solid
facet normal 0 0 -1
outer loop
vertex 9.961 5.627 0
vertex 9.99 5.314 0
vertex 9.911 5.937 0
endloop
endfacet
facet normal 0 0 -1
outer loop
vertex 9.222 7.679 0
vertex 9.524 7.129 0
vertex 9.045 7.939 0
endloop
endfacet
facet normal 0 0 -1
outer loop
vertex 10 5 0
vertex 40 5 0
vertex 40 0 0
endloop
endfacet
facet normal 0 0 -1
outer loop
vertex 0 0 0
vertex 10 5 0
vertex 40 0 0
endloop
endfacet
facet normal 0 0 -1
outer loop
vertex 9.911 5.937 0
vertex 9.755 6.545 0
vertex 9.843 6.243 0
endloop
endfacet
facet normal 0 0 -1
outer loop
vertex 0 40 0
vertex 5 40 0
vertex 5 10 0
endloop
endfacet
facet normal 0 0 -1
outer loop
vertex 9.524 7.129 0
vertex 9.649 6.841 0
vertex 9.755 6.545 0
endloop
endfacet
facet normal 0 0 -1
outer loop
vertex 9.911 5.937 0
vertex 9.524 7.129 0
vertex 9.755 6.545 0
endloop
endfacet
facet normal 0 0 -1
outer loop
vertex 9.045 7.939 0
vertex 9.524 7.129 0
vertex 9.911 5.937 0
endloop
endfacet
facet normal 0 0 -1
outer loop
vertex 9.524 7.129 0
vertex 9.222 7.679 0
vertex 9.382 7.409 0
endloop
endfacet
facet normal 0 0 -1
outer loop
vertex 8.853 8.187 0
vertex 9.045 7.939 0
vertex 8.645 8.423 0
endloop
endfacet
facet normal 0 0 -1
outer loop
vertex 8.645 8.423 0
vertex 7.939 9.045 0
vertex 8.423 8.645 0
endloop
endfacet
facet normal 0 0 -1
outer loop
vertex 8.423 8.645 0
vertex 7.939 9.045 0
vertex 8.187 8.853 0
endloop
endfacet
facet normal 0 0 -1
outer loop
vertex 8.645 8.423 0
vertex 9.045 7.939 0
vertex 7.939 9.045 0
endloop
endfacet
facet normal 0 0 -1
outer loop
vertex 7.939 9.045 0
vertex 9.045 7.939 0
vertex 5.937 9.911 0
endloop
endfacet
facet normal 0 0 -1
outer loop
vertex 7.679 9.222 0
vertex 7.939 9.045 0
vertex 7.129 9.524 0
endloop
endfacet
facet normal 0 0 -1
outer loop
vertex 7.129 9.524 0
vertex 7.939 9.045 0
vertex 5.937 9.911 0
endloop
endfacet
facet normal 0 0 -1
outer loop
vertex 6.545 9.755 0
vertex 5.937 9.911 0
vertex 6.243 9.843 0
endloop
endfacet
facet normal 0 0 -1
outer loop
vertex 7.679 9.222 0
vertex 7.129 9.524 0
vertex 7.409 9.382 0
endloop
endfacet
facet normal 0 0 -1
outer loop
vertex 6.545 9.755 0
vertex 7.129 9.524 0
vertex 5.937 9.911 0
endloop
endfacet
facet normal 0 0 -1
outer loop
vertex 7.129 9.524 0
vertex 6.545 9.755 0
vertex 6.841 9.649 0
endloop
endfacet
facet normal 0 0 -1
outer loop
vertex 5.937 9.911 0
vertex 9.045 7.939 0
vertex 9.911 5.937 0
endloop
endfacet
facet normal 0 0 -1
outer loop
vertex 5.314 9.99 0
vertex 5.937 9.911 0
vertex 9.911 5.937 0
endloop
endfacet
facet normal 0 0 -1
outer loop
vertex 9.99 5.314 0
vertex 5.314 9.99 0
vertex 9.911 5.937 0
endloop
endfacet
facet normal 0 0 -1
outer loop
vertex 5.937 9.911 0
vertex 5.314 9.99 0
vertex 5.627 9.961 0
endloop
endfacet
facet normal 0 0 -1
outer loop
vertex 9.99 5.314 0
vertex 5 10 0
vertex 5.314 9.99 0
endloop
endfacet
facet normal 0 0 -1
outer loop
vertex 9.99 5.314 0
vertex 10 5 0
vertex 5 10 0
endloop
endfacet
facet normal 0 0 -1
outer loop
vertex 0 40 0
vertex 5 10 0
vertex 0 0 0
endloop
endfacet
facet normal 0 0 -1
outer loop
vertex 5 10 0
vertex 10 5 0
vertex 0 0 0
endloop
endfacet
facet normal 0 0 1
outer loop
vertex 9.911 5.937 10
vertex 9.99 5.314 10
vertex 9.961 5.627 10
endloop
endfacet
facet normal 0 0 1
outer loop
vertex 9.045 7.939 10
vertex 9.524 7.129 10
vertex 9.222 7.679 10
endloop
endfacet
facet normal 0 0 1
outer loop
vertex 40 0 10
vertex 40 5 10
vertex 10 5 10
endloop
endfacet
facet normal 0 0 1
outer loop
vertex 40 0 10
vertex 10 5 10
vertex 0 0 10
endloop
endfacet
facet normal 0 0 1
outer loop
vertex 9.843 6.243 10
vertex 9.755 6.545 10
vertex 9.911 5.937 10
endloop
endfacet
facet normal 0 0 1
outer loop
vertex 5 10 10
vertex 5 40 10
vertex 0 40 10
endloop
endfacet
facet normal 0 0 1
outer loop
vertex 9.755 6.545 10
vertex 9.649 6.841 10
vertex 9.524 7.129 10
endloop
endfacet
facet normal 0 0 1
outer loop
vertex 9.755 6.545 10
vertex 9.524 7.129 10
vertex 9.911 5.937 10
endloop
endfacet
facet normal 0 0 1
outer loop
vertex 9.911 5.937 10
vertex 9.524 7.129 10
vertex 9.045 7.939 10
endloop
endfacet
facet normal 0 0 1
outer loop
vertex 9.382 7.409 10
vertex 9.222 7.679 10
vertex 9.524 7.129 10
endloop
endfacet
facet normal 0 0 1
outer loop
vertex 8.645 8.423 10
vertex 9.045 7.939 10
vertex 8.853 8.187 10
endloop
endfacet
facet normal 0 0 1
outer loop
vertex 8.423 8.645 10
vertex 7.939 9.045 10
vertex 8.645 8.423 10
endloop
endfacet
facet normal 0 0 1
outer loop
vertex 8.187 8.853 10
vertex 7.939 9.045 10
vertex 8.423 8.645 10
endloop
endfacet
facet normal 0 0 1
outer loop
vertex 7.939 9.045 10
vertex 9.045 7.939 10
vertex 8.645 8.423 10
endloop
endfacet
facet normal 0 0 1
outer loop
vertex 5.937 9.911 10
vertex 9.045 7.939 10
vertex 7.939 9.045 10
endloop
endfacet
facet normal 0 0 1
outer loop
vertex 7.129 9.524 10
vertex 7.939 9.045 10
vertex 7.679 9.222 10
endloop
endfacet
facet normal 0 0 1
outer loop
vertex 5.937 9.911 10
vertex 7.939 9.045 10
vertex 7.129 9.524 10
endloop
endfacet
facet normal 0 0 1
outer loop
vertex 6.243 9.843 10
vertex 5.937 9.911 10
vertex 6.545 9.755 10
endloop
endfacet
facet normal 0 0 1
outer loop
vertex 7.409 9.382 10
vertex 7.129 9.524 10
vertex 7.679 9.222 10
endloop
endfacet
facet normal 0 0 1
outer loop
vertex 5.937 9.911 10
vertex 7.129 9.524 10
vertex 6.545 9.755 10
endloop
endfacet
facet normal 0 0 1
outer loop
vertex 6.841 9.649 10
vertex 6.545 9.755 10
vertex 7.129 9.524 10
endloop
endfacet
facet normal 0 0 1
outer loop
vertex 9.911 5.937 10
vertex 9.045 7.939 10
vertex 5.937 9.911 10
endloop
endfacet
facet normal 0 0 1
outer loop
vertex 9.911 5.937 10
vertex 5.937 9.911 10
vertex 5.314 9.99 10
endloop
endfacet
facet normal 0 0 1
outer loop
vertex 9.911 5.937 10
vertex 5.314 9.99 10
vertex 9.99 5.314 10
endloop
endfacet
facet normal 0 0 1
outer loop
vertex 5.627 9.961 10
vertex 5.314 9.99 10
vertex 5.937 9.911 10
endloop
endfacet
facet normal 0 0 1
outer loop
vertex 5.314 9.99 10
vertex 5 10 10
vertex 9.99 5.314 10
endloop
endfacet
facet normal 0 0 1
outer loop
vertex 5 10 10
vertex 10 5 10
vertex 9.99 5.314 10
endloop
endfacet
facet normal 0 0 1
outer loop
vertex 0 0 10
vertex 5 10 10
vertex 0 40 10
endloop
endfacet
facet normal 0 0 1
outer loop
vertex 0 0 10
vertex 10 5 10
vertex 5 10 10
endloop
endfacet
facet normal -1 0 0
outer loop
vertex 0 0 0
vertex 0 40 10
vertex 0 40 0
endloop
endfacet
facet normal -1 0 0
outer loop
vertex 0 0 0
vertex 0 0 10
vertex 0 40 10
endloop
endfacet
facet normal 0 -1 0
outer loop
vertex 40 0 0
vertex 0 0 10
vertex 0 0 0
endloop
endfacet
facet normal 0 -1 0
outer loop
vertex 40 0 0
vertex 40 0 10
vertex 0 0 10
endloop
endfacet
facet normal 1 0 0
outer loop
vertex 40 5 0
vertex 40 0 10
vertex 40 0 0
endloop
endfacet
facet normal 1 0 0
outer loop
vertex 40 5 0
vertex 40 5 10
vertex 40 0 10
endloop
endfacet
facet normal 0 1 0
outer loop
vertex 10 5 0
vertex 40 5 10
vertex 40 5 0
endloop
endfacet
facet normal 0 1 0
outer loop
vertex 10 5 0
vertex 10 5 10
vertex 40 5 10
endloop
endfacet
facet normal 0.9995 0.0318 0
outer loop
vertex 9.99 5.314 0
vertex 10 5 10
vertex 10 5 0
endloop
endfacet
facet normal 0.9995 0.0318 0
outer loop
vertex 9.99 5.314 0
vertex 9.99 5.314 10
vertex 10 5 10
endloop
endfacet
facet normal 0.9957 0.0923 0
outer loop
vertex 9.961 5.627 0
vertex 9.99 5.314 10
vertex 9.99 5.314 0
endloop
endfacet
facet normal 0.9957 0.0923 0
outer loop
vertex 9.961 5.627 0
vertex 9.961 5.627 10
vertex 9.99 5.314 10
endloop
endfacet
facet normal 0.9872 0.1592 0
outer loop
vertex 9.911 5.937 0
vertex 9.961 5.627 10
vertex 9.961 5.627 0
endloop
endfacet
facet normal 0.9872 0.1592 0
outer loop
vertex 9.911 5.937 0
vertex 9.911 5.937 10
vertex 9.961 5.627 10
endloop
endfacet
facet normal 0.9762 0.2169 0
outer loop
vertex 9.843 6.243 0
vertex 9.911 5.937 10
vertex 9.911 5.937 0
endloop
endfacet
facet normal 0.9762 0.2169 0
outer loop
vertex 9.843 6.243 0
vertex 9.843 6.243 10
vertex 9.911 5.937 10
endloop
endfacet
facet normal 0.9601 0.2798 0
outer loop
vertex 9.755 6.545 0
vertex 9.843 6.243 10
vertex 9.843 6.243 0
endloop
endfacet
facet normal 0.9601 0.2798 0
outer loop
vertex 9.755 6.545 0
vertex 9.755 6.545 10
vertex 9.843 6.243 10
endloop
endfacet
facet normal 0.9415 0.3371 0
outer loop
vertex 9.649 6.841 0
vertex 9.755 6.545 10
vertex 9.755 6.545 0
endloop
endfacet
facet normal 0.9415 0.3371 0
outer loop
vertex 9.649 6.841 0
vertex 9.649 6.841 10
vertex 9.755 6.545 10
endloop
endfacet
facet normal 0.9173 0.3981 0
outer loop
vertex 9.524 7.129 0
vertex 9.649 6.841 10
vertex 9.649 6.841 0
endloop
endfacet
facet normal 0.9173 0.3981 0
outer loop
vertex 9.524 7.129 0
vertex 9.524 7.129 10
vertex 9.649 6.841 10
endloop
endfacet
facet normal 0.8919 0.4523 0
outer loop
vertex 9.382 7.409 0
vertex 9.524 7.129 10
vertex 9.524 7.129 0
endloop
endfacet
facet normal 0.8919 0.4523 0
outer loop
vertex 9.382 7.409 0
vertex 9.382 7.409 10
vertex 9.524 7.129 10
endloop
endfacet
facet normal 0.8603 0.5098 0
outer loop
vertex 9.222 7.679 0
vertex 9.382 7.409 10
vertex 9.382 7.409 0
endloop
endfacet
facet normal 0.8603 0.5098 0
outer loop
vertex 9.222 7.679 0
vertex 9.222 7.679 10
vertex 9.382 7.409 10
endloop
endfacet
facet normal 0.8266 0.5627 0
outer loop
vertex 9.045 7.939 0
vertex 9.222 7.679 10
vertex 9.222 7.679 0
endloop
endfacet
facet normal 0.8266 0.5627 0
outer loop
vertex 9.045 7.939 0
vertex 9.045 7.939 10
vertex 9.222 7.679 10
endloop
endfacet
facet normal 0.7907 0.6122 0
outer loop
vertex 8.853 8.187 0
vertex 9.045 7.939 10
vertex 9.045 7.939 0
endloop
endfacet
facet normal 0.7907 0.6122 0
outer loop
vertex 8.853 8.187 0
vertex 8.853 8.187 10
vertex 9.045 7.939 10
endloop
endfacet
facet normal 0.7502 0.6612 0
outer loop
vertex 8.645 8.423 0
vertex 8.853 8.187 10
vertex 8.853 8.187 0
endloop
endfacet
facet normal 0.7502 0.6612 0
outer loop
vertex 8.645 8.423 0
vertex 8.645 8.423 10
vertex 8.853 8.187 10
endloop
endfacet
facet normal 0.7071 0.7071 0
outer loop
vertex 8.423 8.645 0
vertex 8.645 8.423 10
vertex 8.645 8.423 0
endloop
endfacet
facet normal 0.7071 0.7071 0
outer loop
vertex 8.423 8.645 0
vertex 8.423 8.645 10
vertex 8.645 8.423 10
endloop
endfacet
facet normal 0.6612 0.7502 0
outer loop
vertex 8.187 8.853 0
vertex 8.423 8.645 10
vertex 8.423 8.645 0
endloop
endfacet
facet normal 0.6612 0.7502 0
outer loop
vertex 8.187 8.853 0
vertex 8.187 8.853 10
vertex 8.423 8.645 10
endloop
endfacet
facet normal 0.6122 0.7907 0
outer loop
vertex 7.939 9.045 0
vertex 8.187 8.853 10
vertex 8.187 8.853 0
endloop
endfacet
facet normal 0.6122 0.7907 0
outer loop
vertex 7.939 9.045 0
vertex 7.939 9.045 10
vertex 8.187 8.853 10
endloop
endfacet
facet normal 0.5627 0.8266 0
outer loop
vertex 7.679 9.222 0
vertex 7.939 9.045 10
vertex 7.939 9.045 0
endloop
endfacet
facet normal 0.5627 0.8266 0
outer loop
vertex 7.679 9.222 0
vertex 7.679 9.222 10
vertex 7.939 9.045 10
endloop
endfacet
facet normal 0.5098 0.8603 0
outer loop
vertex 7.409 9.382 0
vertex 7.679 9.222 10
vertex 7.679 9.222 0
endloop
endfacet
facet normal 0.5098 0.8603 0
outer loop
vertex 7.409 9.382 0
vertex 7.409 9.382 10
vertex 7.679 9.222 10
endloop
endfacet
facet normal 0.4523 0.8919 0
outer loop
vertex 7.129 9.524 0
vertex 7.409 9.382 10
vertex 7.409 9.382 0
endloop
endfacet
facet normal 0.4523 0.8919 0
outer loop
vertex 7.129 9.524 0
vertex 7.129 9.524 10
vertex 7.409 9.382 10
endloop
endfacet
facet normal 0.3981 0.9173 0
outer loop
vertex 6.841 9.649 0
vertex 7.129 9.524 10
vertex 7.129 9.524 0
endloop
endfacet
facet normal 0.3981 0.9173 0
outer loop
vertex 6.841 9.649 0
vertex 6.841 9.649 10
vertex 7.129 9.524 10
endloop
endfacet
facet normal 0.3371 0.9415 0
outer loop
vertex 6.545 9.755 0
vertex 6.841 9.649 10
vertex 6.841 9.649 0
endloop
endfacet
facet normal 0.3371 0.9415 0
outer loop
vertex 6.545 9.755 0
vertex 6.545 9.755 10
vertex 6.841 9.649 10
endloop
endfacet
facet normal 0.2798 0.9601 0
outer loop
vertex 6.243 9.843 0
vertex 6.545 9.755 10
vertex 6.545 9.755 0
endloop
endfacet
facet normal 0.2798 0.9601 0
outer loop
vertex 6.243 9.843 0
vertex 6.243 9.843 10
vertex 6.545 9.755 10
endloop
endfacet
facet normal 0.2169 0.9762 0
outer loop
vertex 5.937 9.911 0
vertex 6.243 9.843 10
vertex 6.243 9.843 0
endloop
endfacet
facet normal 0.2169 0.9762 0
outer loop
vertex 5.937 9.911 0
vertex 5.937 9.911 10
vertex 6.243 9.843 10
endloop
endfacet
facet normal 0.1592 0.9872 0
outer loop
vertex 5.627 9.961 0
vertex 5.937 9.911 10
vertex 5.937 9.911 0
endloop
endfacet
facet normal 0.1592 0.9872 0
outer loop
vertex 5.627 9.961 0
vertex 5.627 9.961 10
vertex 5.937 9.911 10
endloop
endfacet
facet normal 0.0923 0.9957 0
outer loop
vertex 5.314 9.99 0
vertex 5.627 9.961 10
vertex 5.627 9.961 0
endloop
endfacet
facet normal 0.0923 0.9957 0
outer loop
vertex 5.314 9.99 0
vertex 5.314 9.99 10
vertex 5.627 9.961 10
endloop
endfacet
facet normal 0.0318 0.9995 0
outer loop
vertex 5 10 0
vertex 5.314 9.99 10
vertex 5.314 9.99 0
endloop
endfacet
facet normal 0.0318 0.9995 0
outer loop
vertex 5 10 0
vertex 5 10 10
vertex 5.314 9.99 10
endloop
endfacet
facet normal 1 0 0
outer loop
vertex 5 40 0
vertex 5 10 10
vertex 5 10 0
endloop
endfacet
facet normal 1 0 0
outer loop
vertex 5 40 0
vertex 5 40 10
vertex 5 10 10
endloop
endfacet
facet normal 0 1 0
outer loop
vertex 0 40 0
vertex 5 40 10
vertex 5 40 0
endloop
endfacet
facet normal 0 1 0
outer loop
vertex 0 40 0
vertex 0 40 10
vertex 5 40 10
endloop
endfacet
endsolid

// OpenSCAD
$fn = 100;

linear_extrude(10)
union() {
    difference() {
        square([40,40]);
        translate([5,5])
            square([35,35]);
    }

    translate([5,5])
        intersection() {
            circle(r=5);
            square([5,5]);
        }
}
